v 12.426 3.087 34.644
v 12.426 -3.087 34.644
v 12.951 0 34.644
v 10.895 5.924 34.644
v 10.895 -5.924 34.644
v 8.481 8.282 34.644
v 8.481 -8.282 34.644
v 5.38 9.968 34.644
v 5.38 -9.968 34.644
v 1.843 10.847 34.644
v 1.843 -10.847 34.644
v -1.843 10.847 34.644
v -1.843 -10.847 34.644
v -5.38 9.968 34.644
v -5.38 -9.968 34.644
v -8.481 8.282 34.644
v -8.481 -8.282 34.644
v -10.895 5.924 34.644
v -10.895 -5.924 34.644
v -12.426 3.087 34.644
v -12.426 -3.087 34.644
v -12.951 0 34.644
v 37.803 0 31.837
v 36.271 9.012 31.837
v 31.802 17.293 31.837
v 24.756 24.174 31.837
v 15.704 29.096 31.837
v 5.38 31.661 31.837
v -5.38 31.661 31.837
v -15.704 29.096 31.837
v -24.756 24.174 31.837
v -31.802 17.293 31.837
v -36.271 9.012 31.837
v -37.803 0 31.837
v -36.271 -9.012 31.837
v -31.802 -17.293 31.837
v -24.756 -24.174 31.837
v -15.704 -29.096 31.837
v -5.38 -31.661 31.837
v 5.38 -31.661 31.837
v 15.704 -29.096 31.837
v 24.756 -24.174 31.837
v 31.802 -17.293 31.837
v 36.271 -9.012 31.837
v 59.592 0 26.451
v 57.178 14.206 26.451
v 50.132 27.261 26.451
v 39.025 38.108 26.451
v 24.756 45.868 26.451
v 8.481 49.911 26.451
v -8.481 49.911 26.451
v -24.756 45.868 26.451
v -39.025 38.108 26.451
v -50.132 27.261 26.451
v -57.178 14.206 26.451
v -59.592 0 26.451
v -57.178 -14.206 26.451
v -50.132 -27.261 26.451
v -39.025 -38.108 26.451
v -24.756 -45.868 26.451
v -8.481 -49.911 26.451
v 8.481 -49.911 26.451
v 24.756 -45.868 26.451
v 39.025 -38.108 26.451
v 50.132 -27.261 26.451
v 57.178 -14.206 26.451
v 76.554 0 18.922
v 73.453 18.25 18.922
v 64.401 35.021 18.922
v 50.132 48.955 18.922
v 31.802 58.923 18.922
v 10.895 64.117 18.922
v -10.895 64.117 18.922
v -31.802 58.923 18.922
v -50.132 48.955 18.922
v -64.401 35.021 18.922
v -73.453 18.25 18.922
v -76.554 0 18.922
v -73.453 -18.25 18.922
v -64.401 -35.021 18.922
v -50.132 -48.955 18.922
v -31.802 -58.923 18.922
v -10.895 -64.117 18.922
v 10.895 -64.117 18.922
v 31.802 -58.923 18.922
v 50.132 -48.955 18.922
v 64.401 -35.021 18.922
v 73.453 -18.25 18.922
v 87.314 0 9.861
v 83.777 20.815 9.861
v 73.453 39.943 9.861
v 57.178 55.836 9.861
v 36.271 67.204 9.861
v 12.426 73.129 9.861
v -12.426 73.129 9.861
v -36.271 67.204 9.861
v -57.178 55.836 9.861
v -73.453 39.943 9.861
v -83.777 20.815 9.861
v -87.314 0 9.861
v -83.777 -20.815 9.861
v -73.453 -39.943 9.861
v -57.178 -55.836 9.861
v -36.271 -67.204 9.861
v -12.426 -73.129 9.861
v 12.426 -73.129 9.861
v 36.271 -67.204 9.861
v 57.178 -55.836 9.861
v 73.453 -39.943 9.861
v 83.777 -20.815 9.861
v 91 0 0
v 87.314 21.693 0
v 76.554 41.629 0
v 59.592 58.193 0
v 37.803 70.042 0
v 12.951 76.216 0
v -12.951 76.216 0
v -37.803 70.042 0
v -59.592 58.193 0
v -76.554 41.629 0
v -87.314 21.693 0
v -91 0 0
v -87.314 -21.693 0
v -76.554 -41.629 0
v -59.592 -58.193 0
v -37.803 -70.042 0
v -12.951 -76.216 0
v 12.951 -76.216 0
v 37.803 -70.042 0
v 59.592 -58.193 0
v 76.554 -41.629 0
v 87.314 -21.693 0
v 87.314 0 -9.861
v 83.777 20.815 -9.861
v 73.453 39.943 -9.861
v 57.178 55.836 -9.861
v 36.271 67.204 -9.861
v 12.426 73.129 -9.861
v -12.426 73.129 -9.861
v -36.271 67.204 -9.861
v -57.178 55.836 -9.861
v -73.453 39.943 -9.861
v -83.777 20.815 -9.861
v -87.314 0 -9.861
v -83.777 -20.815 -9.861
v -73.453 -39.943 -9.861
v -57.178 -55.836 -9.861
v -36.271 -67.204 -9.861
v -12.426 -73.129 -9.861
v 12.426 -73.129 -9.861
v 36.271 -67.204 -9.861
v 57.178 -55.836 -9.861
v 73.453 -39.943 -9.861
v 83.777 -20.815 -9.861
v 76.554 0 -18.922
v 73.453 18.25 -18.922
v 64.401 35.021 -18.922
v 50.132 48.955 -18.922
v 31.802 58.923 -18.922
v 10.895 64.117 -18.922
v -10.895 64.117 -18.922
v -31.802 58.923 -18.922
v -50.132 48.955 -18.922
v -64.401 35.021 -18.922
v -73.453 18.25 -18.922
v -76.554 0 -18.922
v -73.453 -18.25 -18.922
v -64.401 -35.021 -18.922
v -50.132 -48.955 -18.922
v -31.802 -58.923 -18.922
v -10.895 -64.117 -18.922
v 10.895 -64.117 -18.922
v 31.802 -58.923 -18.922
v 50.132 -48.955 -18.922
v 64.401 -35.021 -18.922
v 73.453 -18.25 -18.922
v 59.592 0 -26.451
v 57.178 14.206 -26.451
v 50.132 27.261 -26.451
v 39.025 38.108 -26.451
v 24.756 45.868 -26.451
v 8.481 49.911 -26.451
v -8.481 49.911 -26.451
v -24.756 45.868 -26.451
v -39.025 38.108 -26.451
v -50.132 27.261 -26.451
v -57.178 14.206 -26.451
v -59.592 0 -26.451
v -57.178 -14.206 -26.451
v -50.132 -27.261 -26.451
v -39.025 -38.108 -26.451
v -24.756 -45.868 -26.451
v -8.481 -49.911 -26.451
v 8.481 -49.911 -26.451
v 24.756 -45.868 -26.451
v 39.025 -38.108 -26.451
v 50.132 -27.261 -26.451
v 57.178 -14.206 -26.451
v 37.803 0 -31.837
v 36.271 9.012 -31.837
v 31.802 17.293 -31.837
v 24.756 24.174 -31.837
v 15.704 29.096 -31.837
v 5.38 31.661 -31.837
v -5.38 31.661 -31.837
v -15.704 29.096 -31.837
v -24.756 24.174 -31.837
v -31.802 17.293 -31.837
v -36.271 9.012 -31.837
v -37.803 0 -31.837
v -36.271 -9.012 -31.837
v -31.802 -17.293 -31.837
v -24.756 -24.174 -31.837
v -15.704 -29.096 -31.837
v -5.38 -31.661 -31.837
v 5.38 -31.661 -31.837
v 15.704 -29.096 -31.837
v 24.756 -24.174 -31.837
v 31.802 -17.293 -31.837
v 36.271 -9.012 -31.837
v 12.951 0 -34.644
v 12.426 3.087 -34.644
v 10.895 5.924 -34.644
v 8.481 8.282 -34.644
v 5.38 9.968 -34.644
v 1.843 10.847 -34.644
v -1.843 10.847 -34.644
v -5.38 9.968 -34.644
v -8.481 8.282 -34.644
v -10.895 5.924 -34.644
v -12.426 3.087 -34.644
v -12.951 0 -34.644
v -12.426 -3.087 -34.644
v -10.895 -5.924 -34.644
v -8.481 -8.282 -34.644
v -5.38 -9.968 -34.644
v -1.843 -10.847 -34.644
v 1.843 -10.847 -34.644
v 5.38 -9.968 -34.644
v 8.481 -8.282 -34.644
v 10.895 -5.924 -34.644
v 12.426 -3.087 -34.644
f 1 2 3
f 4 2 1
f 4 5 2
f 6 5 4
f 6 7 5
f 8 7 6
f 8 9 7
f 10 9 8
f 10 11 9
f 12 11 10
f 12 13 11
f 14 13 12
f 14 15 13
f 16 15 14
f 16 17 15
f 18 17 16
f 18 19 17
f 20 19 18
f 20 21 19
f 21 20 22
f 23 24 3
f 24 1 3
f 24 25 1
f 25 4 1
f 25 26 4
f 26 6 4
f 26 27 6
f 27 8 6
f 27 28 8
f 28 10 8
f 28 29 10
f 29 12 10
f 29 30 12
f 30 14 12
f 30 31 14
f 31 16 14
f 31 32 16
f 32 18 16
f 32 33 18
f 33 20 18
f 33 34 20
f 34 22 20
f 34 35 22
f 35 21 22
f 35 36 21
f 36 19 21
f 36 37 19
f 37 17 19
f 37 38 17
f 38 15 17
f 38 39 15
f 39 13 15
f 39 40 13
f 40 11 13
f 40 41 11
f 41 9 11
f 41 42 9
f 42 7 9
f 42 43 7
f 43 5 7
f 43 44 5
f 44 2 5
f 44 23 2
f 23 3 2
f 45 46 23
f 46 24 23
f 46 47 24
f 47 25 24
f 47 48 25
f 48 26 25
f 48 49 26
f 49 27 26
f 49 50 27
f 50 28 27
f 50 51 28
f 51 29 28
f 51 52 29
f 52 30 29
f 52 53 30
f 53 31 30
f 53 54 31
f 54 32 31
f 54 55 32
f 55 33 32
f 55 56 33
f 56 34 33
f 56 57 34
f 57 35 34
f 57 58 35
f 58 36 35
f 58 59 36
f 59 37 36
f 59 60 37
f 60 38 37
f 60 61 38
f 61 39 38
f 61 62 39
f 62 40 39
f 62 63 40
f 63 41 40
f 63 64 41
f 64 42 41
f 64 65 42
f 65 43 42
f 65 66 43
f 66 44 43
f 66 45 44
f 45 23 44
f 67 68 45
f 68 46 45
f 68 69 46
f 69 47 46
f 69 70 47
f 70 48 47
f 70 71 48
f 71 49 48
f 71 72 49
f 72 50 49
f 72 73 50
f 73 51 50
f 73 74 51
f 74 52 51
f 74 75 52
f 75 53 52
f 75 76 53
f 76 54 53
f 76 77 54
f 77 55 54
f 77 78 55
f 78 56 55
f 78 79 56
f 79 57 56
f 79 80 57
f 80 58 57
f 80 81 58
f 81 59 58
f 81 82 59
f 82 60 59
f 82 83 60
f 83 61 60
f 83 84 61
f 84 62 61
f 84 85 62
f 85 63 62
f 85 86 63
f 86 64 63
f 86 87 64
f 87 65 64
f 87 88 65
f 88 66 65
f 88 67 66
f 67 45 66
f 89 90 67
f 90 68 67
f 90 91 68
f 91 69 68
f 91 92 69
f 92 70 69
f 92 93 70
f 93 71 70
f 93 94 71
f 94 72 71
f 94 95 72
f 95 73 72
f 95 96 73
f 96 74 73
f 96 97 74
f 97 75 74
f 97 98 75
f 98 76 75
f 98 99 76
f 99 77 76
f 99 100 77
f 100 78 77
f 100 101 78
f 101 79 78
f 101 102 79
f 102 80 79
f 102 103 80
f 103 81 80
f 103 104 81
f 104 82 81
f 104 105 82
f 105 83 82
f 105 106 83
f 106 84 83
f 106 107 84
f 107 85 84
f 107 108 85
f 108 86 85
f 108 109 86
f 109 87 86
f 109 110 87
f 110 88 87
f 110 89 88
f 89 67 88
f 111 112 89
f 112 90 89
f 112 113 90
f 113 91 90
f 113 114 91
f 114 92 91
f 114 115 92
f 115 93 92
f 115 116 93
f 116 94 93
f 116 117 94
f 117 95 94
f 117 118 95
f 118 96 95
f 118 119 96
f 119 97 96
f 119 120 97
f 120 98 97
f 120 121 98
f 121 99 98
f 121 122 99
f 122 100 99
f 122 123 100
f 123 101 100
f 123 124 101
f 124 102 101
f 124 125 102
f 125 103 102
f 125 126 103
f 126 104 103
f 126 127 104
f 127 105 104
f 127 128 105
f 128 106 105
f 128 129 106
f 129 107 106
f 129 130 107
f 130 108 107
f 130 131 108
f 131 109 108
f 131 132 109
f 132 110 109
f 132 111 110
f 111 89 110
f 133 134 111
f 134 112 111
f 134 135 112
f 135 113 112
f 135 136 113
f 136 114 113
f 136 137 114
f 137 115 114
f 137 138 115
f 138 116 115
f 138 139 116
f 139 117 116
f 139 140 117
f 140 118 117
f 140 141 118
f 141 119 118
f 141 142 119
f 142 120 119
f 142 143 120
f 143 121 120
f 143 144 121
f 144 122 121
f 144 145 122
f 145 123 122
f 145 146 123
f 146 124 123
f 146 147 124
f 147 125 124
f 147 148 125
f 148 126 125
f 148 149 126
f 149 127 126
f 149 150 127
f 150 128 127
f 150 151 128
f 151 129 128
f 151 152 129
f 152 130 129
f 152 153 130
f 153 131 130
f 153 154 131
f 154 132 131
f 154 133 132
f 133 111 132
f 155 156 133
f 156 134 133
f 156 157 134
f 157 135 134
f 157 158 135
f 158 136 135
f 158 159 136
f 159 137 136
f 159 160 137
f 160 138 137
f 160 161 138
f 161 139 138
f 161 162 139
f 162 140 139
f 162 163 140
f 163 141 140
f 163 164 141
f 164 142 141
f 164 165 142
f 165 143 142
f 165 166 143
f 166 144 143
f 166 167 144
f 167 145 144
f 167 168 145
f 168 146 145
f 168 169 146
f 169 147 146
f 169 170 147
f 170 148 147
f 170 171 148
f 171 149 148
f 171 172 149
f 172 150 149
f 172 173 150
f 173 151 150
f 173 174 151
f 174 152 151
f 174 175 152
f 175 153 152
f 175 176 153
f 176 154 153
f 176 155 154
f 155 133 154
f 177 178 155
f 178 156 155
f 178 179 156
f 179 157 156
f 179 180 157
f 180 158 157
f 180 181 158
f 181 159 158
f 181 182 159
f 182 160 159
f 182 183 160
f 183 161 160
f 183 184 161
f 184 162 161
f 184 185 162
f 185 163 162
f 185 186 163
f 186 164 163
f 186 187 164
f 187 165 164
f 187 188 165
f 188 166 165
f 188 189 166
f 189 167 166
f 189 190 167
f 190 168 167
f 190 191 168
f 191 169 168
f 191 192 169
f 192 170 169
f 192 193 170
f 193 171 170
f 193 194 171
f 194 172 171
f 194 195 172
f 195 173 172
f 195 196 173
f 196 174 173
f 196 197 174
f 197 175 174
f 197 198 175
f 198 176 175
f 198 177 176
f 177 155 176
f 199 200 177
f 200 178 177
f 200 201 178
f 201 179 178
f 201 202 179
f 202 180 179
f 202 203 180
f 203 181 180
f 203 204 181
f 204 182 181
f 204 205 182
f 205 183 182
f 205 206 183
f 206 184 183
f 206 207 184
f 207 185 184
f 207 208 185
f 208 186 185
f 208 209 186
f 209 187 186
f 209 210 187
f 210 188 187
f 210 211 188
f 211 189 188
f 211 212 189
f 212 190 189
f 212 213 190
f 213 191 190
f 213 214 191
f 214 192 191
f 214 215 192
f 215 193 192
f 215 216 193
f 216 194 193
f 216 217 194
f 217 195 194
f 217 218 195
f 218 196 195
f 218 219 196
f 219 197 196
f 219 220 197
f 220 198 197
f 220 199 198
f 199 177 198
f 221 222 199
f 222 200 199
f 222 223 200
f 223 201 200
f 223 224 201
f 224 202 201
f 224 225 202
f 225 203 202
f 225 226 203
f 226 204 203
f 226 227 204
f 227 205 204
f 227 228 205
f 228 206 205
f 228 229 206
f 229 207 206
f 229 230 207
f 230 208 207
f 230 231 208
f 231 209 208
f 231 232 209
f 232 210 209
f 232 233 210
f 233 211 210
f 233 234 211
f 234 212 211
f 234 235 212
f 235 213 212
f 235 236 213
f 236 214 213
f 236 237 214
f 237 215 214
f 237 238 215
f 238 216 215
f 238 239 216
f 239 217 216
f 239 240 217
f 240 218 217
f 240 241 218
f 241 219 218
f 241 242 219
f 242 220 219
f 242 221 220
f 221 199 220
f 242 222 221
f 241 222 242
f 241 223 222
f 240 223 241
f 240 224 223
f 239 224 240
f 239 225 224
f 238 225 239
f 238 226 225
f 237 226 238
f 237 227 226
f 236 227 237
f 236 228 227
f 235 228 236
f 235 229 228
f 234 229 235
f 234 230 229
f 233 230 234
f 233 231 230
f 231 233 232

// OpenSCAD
// Generated by SolidPython 1.0.1 on 2020-07-29 00:46:50


scale(v = [13, 11, 5]) {
	sphere(r = 7);
}
/***********************************************
*********      SolidPython code:      **********
************************************************
 
# import packages: SolidPython
from solid import *
from solid.utils import *
from itertools import chain, combinations, permutations


class Resize:

    def __init__(self, scad_file):
        self.scad_file = scad_file
        #self.scad_file = import_scad(scad_file)
        # cone/cylinder param:
        self.r1 = 0
        self.r2 = 0
        self.h = 0
        # rectangular prism param:
        self.w = 0
        self.l = 0
        # ellipse param:
        self.r = 0

    # import OpenScad code (file name corresponds to shape)


    # classify shape + parameters
    def assign(self, param1, param2, param3):
        if self.scad_file == 'cone.scad':
            self.r1 = param1
            self.r2 = param2
            self.h = param3
        elif self.scad_file == 'cylinder.scad':
            self.r1 = param1
            self.r2 = param2
            self.h = param3
        elif self.scad_file == 'rectangularPrism.scad':
            self.h = param1
            self.l = param2
            self.w = param3
        else:
            self.r = param1
            self.h = param2

    # resize parameters
    def iterate(self):
        x = range(3, 20, 2)
        i = 1
        if self.scad_file == 'cone.scad':
            tempList = list(permutations(x, 2))
            for temp in tempList:
                param1 = temp[0]
                param2 = temp[1]
                filepath = 'produced_scad_files/' + 'cone' + str(param1) + '_' + str(param2) + '_' + '.scad'
                scad_render_to_file(cylinder(h=param1, r1=param2, r2=0), filepath)

        elif self.scad_file == 'cylinder.scad':
            tempList = list(permutations(x, 3))
            for temp in tempList:
                param1 = temp[0]
                param2 = temp[1]
                filepath = 'produced_scad_files/' + 'cylinder' + str(param1) + '_' + str(param2) + '_' + '.scad'
                scad_render_to_file(cylinder(h=param1, r1=param2, r2=param2), filepath)

        elif self.scad_file == 'rectangularPrism.scad':
            tempList = list(permutations(x, 3))
            for temp in tempList:
                param1 = temp[0]
                param2 = temp[1]
                param3 = temp[2]
                filepath = 'produced_scad_files/' + 'rectangularPrism' + str(param1) + '_' + str(param2) + '_' + str(
                    param3) + '.scad'
                scad_render_to_file(cube(size=(param1, param2, param3)), filepath)

        elif self.scad_file == 'ellipse.scad':
            tempList = list(permutations(x, 4))
            for temp in tempList:
                param1 = temp[0]
                param2 = temp[1]
                param3 = temp[2]
                param4 = temp[3]
                filepath = 'produced_scad_files/' + 'ellipse' + str(param1) + '_' + str(param2) + '_' + str(param3) + '_' + str(param4) + '.scad'
                scad_render_to_file(scale([param1, param2, param3])(sphere(r=param4)), filepath)

    def render_to_scadfile(self):
        scad_render_to_file(scad, 'example.scad') 
 
************************************************/
